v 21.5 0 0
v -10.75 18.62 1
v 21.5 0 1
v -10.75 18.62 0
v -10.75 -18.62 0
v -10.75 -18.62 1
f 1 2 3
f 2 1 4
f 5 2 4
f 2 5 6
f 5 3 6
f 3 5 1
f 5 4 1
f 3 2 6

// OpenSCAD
// hole 24mm
// arrow 39mmx39mmx39mm  42.55 R3.5
//button 46mm


t_d = 43;



cylinder(d=t_d,$fn=3);
